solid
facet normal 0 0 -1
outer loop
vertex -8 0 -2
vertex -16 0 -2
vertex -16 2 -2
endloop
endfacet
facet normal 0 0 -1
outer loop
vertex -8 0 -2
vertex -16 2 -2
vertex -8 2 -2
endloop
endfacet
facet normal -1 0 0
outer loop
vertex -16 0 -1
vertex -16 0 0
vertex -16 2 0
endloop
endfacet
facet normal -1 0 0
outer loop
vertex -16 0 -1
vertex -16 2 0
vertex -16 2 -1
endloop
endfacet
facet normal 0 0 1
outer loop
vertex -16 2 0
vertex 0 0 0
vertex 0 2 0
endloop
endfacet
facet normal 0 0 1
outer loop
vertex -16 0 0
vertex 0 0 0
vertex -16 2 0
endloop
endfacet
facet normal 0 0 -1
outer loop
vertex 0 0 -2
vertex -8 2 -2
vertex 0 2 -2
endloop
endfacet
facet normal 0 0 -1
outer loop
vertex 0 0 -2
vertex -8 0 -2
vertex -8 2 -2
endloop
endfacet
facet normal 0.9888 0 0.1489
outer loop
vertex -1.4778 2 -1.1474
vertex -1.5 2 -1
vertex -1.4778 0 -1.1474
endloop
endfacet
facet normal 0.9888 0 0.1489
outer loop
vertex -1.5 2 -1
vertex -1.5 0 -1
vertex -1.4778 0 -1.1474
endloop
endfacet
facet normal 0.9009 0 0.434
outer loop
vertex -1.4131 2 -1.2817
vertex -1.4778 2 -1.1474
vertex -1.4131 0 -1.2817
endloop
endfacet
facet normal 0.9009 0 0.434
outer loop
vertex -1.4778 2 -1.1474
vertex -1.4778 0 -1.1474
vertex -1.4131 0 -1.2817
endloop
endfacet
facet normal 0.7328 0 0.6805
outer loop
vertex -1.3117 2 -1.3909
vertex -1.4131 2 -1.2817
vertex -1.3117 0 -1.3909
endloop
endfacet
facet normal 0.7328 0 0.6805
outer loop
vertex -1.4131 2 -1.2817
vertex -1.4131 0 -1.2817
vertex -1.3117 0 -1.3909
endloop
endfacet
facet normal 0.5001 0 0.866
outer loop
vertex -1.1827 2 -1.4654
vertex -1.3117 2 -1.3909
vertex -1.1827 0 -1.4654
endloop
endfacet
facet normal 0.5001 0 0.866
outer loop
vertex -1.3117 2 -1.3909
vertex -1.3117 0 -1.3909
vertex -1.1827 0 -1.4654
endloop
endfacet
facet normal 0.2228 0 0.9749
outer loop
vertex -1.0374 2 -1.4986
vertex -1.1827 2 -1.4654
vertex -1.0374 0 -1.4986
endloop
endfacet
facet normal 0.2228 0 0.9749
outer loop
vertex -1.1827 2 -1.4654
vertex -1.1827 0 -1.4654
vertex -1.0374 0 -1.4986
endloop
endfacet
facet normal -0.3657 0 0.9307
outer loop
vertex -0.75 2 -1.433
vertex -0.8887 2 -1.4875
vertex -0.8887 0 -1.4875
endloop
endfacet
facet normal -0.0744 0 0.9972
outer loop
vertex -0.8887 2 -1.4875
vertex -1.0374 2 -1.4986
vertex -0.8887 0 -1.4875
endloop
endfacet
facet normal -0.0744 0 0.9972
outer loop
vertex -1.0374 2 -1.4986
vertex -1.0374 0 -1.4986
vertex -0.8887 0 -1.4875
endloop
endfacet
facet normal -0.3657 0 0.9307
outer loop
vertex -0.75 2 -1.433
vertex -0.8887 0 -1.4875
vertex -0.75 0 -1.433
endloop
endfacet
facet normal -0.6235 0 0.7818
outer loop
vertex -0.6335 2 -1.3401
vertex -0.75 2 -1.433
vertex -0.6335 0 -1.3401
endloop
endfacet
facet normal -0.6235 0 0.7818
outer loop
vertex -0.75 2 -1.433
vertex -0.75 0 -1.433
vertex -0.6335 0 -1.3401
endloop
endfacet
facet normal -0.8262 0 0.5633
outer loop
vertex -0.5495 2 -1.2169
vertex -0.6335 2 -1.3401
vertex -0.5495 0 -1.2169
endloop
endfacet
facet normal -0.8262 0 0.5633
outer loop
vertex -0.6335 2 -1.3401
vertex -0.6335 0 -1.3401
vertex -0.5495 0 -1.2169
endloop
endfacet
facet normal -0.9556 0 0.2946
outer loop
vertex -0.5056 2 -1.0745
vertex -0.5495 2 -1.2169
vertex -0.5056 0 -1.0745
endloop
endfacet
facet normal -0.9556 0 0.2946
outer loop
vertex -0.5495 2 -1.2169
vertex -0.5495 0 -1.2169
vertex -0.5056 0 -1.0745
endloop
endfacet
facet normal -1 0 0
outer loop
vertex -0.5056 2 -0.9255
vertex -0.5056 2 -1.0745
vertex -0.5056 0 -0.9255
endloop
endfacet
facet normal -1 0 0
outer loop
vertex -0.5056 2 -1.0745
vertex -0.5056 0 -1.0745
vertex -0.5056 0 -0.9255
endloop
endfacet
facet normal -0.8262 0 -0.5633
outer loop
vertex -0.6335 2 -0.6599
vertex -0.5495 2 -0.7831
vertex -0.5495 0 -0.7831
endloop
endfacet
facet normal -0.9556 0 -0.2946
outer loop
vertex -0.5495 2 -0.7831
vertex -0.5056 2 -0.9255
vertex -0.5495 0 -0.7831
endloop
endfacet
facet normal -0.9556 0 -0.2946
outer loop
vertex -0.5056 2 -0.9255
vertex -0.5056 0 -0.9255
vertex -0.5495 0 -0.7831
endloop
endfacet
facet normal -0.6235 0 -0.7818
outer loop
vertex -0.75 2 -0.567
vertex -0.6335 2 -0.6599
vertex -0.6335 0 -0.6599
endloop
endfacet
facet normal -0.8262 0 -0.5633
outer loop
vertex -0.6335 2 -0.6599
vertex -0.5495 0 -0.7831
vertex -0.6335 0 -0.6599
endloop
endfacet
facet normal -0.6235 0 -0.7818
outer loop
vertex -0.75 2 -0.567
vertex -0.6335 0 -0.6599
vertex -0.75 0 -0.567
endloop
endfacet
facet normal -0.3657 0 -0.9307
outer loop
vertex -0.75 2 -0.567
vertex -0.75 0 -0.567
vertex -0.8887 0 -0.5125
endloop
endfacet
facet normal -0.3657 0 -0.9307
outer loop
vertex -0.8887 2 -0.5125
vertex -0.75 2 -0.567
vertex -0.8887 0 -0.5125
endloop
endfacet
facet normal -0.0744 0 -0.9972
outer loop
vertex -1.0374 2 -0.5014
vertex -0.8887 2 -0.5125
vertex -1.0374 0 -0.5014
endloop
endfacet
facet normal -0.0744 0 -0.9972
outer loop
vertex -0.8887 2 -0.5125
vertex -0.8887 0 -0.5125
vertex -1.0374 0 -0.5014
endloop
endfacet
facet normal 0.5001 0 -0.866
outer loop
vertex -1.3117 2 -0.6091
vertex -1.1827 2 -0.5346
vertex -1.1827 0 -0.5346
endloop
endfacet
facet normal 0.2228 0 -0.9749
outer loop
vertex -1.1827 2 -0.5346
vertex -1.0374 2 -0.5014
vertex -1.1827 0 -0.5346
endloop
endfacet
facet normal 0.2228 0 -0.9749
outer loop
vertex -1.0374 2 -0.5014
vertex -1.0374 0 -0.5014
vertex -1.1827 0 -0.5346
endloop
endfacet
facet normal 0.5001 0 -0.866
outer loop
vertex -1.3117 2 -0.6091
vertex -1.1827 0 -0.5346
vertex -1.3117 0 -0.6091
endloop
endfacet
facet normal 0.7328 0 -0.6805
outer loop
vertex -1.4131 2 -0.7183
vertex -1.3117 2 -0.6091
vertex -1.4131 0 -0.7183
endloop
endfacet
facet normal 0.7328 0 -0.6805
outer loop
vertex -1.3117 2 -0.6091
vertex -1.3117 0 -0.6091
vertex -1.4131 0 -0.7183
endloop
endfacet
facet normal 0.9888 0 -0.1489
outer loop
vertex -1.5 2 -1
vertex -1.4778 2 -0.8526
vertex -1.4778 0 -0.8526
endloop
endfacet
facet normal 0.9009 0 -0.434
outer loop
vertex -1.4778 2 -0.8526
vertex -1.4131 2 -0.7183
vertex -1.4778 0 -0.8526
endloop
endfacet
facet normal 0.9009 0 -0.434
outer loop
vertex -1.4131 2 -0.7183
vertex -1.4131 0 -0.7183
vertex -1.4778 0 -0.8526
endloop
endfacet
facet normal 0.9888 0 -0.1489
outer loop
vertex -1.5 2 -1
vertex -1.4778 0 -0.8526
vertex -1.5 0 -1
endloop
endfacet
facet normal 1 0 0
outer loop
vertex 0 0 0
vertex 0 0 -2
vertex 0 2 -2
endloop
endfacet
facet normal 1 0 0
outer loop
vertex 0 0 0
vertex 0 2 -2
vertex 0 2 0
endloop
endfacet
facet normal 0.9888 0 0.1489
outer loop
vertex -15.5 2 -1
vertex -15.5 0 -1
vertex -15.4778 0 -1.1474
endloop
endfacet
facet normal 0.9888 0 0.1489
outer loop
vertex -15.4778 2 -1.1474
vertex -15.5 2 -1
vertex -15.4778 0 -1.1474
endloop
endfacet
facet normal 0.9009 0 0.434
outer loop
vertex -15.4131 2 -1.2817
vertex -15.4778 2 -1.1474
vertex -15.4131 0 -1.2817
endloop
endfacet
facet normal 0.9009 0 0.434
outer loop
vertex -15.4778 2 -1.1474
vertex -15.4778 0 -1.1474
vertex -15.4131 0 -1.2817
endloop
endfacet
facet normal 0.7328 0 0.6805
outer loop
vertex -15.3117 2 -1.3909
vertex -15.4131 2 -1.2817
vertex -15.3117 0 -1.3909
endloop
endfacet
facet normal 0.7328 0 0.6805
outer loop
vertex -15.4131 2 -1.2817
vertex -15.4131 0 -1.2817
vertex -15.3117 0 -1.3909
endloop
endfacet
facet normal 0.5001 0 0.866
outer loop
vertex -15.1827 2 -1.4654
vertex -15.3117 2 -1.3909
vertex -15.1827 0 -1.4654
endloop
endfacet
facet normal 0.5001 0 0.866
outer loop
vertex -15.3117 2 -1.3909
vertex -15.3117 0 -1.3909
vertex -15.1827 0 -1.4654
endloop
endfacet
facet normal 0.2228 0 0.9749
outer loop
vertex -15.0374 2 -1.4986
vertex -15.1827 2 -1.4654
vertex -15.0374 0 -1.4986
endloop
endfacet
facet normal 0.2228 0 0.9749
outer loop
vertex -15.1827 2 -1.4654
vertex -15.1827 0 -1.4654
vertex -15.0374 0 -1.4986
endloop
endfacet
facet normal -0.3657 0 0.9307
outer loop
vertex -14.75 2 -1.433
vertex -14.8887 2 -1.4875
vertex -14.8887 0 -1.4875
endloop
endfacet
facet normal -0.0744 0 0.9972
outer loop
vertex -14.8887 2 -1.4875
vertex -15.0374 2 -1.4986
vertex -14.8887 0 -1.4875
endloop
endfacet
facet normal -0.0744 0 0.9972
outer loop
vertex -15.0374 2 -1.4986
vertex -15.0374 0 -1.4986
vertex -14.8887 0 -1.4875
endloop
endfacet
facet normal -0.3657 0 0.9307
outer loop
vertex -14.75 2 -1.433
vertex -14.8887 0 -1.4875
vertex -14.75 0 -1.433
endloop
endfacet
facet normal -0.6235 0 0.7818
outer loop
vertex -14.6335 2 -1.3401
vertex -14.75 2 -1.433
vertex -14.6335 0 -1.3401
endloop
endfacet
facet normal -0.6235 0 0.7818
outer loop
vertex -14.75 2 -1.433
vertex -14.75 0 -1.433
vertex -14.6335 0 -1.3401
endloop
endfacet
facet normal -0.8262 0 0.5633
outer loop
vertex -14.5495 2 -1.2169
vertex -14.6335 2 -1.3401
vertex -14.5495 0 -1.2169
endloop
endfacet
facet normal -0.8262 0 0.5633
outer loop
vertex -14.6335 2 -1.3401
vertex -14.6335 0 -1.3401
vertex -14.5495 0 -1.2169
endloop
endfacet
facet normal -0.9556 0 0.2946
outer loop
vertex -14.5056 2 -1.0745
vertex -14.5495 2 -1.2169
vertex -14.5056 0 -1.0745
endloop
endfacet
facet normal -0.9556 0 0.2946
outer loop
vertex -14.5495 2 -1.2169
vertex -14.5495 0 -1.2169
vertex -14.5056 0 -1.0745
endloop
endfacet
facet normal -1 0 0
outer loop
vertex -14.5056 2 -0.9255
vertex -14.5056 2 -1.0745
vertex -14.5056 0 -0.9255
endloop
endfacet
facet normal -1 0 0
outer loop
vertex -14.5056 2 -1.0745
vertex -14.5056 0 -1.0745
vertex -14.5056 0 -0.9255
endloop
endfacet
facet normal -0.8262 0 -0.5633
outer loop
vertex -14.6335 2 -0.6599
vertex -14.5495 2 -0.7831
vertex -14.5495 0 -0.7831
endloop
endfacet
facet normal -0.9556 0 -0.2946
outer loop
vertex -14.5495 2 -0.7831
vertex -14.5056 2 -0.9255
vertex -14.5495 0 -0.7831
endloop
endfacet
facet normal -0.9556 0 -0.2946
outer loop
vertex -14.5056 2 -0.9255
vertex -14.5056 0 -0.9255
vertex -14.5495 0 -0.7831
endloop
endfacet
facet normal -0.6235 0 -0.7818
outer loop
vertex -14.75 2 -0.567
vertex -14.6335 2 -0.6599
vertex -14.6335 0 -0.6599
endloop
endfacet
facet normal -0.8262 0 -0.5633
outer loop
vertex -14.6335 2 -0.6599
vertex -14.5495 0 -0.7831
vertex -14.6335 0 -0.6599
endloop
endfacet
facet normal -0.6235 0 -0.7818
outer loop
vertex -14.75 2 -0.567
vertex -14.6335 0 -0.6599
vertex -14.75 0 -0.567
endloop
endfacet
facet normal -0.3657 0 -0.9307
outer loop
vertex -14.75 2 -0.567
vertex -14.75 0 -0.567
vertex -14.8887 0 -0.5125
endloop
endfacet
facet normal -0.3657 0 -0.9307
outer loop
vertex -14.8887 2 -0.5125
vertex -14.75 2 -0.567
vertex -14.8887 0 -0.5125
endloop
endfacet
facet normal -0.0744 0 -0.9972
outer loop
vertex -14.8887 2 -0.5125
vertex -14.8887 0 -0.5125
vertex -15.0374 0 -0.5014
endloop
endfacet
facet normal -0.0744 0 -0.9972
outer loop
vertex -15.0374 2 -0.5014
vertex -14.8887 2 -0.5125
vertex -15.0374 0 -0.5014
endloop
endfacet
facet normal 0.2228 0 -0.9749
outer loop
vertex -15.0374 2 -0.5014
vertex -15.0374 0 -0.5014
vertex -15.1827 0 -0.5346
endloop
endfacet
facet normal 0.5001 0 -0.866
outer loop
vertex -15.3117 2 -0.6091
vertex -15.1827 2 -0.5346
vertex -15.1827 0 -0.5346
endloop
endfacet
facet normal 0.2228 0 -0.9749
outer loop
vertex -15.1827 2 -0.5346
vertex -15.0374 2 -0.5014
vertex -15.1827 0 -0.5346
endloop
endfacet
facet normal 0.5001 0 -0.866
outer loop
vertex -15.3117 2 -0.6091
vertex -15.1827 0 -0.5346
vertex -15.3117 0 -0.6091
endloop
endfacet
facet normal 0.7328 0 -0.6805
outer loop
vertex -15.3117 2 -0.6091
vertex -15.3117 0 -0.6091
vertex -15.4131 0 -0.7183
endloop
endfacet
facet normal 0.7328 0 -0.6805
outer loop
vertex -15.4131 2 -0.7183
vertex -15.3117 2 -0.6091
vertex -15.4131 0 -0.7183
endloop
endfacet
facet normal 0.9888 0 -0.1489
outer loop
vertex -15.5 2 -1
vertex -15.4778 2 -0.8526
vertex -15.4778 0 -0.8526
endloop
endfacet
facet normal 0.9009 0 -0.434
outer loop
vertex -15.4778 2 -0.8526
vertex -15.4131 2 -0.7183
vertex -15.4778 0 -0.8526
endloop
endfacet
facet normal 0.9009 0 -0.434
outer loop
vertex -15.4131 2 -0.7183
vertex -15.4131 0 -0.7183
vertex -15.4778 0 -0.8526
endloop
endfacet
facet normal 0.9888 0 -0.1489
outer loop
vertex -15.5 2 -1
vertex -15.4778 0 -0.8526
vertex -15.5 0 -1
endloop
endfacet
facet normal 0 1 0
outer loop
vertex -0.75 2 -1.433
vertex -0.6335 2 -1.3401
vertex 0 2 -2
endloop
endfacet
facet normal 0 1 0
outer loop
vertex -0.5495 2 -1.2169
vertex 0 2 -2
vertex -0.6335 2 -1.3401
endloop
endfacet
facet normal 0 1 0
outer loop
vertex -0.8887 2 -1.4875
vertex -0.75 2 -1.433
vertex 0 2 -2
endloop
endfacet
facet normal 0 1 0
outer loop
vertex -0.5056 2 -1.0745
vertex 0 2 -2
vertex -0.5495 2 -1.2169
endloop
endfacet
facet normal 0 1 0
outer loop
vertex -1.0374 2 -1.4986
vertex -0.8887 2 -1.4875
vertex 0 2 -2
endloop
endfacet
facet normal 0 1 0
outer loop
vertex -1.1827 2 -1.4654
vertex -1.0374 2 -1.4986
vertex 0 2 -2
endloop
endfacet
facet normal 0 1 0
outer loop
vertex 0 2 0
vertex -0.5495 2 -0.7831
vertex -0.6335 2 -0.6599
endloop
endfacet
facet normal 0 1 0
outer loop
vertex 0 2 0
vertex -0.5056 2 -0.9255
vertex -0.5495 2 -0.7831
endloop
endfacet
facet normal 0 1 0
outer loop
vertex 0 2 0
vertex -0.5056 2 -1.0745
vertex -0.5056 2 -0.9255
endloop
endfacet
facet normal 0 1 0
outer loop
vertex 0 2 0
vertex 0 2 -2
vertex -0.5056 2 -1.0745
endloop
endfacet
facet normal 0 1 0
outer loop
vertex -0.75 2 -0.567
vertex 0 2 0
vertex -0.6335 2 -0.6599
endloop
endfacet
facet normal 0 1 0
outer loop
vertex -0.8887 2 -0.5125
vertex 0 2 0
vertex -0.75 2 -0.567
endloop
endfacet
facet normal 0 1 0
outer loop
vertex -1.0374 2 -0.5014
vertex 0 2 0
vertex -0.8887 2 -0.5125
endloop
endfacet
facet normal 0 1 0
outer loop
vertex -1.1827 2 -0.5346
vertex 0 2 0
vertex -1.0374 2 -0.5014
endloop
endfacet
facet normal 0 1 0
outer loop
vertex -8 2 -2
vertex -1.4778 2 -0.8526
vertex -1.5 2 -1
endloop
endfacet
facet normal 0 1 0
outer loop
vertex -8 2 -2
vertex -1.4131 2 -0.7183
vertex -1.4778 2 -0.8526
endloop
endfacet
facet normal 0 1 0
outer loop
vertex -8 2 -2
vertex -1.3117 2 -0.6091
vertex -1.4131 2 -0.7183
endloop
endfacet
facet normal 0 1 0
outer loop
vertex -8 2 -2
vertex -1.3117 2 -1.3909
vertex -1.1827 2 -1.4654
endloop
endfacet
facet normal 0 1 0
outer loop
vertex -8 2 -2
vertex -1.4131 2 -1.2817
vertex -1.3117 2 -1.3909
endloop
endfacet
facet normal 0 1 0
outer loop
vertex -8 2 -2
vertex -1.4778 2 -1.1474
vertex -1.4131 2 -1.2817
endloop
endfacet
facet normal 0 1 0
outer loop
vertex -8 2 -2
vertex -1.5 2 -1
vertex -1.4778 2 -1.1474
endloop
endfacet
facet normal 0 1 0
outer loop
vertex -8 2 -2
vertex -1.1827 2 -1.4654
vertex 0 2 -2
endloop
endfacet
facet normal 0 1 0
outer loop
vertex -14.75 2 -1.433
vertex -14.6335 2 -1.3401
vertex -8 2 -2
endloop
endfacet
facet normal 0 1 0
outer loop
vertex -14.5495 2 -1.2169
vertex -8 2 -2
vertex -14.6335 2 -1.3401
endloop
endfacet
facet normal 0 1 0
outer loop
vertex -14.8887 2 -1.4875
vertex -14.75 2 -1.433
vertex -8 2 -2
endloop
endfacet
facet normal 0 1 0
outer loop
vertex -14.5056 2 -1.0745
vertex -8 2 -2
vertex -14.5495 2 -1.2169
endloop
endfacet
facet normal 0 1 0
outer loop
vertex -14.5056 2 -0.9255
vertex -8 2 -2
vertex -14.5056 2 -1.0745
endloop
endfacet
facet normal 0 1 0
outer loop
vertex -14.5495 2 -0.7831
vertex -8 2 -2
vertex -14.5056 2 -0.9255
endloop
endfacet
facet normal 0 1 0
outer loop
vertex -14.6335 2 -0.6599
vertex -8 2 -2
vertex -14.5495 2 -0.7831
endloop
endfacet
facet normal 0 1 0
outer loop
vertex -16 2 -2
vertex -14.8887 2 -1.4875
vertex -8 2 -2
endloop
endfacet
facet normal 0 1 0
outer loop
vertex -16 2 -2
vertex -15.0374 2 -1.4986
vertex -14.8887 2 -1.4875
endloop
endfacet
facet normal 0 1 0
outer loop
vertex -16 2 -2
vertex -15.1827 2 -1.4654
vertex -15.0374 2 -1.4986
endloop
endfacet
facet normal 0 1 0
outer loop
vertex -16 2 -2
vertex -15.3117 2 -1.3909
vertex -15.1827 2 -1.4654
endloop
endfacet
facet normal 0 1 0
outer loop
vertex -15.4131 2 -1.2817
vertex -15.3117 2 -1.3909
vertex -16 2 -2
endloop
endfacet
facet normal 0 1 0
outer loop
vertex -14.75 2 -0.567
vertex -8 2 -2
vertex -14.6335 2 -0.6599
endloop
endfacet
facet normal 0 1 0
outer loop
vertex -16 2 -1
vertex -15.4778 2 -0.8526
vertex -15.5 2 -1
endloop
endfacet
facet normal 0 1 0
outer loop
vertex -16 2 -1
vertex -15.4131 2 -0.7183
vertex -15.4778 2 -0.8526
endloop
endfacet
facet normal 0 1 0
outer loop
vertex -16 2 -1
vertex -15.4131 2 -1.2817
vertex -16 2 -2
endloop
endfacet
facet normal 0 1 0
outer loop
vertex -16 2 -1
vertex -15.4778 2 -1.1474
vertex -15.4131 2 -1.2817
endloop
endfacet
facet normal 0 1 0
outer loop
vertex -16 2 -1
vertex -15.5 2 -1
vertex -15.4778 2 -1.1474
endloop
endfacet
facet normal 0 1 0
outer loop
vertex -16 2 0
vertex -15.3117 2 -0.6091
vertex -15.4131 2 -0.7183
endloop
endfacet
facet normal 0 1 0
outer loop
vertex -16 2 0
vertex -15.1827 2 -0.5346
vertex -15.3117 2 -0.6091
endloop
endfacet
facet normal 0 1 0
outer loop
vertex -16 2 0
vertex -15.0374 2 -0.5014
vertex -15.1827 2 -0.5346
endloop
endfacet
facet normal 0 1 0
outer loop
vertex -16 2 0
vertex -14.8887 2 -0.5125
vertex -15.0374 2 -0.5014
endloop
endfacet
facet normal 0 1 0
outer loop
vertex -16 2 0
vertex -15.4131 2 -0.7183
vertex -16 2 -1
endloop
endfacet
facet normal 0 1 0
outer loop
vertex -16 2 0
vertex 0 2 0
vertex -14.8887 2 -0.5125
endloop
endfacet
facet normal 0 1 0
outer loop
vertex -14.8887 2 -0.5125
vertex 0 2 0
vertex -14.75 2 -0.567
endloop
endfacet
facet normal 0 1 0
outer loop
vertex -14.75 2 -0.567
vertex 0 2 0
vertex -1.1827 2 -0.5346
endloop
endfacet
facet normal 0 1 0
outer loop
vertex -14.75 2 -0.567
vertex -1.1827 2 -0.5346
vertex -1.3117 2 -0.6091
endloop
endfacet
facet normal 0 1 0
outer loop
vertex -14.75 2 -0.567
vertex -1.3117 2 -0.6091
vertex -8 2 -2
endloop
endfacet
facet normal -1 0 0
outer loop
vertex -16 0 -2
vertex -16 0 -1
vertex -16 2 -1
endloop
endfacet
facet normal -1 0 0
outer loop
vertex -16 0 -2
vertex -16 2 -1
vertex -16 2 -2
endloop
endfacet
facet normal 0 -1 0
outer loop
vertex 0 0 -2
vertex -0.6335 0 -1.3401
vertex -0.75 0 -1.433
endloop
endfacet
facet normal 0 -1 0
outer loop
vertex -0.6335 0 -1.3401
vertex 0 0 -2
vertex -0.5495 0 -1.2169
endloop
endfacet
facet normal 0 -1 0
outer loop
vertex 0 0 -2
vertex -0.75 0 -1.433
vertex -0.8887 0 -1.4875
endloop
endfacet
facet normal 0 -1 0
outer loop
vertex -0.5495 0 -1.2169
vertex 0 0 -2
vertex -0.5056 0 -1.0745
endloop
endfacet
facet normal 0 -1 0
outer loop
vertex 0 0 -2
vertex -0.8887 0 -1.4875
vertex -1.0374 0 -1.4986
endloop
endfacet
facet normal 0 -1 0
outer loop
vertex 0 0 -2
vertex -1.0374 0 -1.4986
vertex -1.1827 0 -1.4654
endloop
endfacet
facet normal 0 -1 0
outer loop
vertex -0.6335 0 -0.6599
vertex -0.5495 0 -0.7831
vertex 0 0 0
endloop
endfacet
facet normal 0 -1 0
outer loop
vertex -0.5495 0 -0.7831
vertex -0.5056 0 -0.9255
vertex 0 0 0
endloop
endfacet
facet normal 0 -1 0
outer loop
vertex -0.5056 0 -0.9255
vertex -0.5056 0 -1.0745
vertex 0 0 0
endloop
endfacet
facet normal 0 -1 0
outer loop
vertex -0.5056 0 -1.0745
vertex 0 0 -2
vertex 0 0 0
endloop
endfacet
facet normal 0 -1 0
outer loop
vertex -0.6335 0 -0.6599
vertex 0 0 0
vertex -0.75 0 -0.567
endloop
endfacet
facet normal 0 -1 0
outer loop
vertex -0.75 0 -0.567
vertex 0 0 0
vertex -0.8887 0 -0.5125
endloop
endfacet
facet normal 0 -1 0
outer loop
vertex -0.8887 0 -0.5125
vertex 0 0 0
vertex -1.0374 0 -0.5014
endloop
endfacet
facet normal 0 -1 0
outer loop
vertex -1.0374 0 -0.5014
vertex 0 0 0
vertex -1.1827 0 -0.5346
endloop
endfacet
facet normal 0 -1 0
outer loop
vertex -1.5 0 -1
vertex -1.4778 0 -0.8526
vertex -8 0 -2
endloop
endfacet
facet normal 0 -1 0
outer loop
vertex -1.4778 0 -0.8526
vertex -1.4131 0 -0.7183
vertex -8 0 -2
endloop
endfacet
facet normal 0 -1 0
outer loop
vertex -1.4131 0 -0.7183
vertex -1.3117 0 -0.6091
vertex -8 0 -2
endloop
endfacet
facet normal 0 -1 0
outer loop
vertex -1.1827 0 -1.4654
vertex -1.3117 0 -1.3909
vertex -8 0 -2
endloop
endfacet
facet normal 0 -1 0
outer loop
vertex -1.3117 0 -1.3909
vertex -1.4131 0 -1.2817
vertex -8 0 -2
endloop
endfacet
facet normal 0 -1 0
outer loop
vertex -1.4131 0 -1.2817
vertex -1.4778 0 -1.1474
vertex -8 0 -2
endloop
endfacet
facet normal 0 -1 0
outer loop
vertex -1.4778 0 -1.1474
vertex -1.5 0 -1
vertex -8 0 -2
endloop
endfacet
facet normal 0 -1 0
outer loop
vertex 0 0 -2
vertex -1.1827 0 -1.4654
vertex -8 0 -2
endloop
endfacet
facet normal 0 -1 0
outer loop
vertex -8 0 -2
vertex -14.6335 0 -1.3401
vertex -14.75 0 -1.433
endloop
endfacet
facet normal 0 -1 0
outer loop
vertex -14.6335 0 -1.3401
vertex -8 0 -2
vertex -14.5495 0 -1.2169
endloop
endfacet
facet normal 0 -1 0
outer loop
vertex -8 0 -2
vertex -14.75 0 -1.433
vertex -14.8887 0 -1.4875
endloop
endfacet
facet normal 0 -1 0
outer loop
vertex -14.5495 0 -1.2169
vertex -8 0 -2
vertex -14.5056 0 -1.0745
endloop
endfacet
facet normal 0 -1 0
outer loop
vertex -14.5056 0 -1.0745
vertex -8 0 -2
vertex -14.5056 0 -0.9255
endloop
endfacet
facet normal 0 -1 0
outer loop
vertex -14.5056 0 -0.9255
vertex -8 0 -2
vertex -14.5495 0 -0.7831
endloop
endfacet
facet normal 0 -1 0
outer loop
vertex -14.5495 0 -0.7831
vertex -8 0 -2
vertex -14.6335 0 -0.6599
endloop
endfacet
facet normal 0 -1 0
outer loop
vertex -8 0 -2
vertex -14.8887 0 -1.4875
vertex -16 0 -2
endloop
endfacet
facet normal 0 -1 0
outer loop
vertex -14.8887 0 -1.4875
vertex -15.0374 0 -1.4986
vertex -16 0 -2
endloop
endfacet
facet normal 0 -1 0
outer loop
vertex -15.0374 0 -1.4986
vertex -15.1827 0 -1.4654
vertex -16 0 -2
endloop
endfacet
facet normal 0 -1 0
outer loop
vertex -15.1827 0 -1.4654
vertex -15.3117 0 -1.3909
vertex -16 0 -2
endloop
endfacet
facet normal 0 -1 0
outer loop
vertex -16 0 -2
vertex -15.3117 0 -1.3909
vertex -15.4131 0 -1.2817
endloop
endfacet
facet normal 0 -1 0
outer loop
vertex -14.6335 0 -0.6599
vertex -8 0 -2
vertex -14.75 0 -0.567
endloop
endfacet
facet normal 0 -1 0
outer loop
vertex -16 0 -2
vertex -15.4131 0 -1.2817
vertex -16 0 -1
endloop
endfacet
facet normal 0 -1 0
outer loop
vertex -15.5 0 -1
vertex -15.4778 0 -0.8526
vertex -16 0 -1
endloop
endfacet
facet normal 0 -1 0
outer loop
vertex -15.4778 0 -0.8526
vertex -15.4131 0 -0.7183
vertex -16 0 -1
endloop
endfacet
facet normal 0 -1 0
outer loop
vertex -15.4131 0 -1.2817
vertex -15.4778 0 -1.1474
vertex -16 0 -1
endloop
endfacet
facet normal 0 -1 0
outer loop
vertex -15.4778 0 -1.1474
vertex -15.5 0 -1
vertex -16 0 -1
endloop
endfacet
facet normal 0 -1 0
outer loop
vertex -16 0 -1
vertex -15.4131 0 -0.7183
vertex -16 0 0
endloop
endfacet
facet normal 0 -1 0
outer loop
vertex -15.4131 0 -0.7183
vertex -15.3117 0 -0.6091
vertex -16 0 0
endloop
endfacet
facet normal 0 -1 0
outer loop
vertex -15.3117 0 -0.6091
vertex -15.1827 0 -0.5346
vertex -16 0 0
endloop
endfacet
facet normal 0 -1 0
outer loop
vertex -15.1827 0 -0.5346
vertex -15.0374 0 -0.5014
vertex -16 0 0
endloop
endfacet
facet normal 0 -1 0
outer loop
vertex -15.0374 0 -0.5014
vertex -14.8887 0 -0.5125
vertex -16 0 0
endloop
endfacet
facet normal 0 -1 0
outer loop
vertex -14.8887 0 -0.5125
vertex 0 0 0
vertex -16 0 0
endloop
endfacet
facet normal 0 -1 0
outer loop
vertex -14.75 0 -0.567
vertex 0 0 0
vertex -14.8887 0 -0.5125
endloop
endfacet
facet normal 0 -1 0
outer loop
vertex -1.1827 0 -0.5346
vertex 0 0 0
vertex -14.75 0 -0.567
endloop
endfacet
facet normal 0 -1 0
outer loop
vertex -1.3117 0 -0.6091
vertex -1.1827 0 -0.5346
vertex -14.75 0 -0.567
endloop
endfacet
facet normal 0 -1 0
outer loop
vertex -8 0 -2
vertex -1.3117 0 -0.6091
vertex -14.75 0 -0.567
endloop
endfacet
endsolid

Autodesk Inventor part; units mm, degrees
ref_plane "YZ Plane" through (0, 0, 0) normal (1, 0, 0) x (0, 1, 0)
ref_plane "XZ Plane" through (0, 0, 0) normal (0, 1, 0) x (-1, 0, 0)
ref_plane "XY Plane" through (0, 0, 0) normal (0, 0, 1) x (1, 0, 0)
sketch "Sketch1" plane through (0, 0, 0) normal (0, 1, 0) x (-1, 0, 0)
  line L0 (0, 0) -> (16, 0)
  line L1 (16, 0) -> (16, -2)
  line L2 (16, -2) -> (0, -2)
  line L3 (0, -2) -> (0, 0)
  line L4 (16, -1) -> (15, -1)
  line L5 (8, -2) -> (8, -1)
  circle A0 centre (15, -1) radius 0.5
  circle A1 centre (1, -1) radius 0.5
  dimension "d0" = 16
  dimension "d1" = 2
  dimension "d2" = 1
  dimension "d3" = 1
extrude "Extrusion1" add sketch "Sketch1" along normal blind 2
properties part number "short_link_v1"
